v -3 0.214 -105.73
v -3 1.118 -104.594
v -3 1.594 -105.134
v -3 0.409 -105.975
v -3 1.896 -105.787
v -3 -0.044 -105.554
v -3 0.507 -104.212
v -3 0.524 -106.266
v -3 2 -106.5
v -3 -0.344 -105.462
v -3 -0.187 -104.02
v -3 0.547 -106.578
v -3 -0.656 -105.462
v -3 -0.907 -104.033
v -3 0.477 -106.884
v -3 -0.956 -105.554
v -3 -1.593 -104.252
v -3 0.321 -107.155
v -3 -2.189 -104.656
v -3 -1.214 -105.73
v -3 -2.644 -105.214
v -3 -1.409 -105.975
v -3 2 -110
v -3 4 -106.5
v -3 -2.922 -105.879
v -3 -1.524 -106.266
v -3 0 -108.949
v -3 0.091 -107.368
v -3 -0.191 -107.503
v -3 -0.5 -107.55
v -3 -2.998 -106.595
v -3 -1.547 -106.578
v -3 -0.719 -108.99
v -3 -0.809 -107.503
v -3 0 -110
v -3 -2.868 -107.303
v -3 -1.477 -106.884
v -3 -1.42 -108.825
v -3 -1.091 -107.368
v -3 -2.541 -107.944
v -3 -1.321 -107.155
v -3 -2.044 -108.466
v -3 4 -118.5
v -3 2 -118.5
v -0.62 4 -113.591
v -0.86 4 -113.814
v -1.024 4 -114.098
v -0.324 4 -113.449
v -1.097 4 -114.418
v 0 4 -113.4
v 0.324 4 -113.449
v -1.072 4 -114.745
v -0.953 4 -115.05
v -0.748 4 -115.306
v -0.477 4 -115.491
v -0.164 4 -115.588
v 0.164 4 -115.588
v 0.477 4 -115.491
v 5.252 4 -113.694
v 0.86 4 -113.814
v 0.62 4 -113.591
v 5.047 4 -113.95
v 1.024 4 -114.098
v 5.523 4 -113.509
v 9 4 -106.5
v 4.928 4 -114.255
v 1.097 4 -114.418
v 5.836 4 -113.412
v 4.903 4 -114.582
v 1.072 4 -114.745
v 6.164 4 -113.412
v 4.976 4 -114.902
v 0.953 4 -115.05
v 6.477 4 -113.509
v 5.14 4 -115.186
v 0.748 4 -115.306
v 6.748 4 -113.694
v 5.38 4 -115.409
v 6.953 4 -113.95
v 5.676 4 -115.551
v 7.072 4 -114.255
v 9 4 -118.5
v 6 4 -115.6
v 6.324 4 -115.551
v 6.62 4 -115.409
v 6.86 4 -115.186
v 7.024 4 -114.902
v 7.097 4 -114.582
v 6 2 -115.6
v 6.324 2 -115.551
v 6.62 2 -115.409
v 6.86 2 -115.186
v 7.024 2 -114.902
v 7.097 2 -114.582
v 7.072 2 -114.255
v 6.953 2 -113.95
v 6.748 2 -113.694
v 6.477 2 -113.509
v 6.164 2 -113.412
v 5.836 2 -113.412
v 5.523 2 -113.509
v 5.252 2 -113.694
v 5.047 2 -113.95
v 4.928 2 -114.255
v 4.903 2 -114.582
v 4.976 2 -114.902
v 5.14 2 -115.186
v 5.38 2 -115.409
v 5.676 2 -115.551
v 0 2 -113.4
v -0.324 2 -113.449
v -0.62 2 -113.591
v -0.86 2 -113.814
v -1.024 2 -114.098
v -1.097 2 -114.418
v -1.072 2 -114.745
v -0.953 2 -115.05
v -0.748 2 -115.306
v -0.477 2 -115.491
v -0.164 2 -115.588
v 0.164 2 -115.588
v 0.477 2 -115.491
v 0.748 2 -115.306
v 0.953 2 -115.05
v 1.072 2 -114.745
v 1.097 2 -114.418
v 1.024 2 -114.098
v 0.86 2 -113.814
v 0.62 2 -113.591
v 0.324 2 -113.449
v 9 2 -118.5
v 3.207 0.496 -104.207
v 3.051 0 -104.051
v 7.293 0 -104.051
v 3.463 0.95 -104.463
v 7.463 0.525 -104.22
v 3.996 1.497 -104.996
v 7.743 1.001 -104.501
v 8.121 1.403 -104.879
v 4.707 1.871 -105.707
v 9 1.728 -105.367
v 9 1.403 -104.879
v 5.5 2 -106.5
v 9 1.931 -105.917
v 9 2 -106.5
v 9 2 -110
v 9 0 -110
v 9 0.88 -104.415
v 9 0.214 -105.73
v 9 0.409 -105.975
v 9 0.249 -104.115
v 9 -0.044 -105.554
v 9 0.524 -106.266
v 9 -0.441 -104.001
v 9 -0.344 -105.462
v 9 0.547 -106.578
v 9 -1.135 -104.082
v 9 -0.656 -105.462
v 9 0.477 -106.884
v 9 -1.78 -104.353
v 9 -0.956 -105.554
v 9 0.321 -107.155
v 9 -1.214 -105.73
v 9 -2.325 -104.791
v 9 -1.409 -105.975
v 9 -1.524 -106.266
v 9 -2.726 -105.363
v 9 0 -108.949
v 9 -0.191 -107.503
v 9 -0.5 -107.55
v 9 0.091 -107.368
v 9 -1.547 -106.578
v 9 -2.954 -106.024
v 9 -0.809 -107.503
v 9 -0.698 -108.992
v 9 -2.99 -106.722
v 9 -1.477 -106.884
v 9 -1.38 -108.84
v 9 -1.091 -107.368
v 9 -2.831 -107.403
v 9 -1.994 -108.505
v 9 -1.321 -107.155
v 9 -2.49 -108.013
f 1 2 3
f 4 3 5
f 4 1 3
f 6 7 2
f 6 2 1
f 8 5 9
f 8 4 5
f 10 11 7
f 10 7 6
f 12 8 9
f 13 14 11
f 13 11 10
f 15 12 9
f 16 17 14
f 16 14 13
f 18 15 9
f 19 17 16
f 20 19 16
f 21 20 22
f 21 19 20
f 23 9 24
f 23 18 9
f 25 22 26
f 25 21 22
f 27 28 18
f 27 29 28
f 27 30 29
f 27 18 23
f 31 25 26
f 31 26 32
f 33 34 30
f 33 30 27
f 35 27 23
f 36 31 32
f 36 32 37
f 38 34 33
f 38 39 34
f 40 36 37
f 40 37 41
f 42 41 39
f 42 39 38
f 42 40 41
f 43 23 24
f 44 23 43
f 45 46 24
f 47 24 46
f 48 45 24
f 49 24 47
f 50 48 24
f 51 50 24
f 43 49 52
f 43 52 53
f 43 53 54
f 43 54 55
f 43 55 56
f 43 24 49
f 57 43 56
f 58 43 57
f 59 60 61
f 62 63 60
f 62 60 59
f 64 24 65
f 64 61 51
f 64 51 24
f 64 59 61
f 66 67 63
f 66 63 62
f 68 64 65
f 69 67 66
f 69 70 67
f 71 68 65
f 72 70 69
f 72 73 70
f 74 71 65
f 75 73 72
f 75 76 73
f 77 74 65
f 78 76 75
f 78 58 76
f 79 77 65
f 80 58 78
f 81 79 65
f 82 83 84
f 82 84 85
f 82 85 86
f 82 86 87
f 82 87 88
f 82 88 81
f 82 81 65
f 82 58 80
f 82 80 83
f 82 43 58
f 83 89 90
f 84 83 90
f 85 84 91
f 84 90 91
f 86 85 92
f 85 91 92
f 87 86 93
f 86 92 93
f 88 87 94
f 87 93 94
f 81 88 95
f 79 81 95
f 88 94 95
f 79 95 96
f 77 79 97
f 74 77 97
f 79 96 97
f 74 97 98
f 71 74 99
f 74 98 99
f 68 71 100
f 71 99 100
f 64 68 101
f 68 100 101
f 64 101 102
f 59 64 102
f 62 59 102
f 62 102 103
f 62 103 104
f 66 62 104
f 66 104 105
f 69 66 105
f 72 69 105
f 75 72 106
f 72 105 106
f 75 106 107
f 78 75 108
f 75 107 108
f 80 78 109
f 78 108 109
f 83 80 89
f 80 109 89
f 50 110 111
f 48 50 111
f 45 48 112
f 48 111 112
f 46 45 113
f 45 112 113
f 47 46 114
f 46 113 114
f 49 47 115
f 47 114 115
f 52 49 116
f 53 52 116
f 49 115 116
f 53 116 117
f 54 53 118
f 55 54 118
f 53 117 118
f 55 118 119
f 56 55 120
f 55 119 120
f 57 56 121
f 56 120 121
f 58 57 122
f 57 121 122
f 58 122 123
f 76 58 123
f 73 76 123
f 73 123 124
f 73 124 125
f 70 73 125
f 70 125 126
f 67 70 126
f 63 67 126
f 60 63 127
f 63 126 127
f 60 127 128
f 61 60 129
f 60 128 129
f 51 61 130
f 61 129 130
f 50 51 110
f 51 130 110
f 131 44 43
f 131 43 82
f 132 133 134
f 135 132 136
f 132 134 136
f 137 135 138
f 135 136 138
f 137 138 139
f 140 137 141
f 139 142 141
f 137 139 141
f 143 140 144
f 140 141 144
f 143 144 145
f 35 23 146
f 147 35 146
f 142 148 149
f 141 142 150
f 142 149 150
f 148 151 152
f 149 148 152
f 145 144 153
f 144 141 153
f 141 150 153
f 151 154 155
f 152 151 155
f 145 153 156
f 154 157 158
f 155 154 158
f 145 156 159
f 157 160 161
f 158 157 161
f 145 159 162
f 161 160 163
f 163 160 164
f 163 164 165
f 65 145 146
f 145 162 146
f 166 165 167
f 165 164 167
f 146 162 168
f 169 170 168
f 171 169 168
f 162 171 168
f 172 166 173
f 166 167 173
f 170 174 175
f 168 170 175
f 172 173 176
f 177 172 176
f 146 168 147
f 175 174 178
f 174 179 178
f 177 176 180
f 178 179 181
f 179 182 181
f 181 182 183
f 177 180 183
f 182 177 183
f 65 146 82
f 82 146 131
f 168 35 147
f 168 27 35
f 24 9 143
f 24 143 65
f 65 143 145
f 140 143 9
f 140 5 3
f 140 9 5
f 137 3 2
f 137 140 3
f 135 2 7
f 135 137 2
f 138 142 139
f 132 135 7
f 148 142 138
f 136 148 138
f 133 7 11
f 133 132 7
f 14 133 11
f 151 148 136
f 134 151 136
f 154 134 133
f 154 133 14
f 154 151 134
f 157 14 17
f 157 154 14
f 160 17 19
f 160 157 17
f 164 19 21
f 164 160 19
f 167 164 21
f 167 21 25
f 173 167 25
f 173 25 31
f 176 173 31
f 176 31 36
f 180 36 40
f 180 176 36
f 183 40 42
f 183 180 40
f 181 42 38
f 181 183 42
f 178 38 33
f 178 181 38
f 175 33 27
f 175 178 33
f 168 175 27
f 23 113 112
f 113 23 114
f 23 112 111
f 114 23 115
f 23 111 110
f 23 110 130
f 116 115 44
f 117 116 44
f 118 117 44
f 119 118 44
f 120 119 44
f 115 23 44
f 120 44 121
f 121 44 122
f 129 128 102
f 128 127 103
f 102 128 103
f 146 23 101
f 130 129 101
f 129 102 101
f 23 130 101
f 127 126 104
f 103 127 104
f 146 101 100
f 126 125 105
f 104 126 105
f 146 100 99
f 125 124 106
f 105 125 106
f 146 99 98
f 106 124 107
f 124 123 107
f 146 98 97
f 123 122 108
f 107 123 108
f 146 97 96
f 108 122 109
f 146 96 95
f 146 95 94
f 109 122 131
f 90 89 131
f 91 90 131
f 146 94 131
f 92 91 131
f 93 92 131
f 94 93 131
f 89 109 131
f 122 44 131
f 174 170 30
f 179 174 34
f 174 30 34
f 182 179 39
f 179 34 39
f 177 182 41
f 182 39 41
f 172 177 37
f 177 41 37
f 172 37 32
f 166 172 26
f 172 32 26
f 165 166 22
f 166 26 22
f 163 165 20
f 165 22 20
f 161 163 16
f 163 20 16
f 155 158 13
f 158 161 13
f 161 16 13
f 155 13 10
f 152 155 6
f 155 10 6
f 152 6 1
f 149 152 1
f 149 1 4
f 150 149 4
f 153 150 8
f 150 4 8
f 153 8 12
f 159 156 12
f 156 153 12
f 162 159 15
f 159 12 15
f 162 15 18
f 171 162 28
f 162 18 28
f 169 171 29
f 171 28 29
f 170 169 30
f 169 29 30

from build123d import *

# Parameters (mm, degrees)
SKETCH_1_W                      = 9.5
SKETCH_1_H                      = 13.25
EXTRUDE_1_DEPTH                 = 2
EXTRUDE_2_DEPTH                 = 12
PATTERN_LINEAR_1_COUNT          = 5
PATTERN_LINEAR_1_PITCH          = 22
HOLE_WIZARD_2_2_2_2_1_D         = 2.1
EXTRUDE_3_DEPTH                 = 12
SKETCH_7_W                      = 1.05
SKETCH_7_H                      = 15
EXTRUDE_4_DEPTH                 = 110
HOLE_WIZARD_2_0_2_2_D           = 2
HOLE_WIZARD_2_0_2_2_ON_FACE_2_D = 2
CUT_EXTRUDE_1_DEPTH             = 135.480746763
CUT_EXTRUDE_1_DEPTH_BACK        = 135.480746763
SKETCH_14_W                     = 52.846717088
SKETCH_14_H                     = 8
SKETCH19_W                      = 12
SKETCH19_H                      = 12
EXTRUDE23_DEPTH                 = 2
SKETCH20_R                      = 1.1
EXTRUDE24_DEPTH                 = 2
CUT_EXTRUDE_2_DEPTH             = 22
CUT_EXTRUDE_2_DEPTH_BACK        = 24
SKETCH_15_W                     = 124.248356878
SKETCH_15_H                     = 108.553418936
CUT_EXTRUDE_START               = -90
CUT_EXTRUDE_3_DEPTH             = 90
CUT_EXTRUDE_4_DEPTH             = 18
CUT_EXTRUDE_4_DEPTH_BACK        = 16
SKETCH_18_W                     = 34.927969389
SKETCH_18_H                     = 20.970488767


with BuildPart() as part:
    # 草图1 → 凸台-拉伸1 (new body)
    with BuildSketch(Plane(origin=(0, 0, 0), x_dir=(1, 0, 0), z_dir=(0, 1, 0))):
        Polygon((21.5, 0), (21.5, 110), (9, 110), (0, 101), (0, 0), align=None)
        Polygon((19.121320344, 101), (4.242640687, 101), (8.121320344, 104.878679656), (19.121320344, 104.878679656), align=None, mode=Mode.SUBTRACT)
        with Locations((10.75, 12.625)):
            Rectangle(SKETCH_1_W, SKETCH_1_H, mode=Mode.SUBTRACT)
        with Locations((10.75, 37.875)):
            Rectangle(SKETCH_1_W, SKETCH_1_H, mode=Mode.SUBTRACT)
        with Locations((10.75, 63.125)):
            Rectangle(SKETCH_1_W, SKETCH_1_H, mode=Mode.SUBTRACT)
        with Locations((10.75, 88.375)):
            Rectangle(SKETCH_1_W, SKETCH_1_H, mode=Mode.SUBTRACT)
    extrude(amount=EXTRUDE_1_DEPTH)

    # 草图2 → 凸台-拉伸2 (add)
    with BuildSketch(Plane(origin=(0, 0, -101), x_dir=(-1, 0, 0), z_dir=(0, 0, -1))):
        with BuildLine():
            Line((0, 2), (0, 0))
            Line((0, 0), (3.5, 0))
            ThreePointArc((3.5, 0), (5.08113883, 4.436491673), (1.050510257, 2))
            Line((1.050510257, 2), (0, 2))
        make_face()
    extrude_2 = extrude(amount=-EXTRUDE_2_DEPTH)

    # 阵列(线性)1: 凸台-拉伸2 ×5
    with Locations(*[(0, 0, i * PATTERN_LINEAR_1_PITCH) for i in range(1, PATTERN_LINEAR_1_COUNT)]):
        add(extrude_2)

    # Ø2.2 (2.2) 直径孔1 (through all)
    with Locations(Plane(origin=(0, 0, -101), x_dir=(-1, 0, 0), z_dir=(0, 0, -1))):
        with Locations((3.5, 2.5)):
            Hole(HOLE_WIZARD_2_2_2_2_1_D / 2)

    # 草图5 → 凸台-拉伸3 (add)
    with BuildSketch(Plane(origin=(9, 0, 0), x_dir=(0, 0, -1), z_dir=(1, 0, 0))):
        with BuildLine():
            Line((108.949489743, 0), (110, 0))
            Line((110, 0), (110, 2))
            Line((110, 2), (106.5, 2))
            ThreePointArc((106.5, 2), (104.91886117, -2.436491673), (108.949489743, 0))
        make_face()
    extrude(amount=-EXTRUDE_3_DEPTH)

    # 草图7 → Ø2.2 (2.2) 直径孔2 (revolve, cut)
    with BuildSketch(Plane(origin=(9, -0.5, -106.5), x_dir=(0, 0, -1), z_dir=(0, 1, 0))):
        with Locations((0.525, 7.5)):
            Rectangle(SKETCH_7_W, SKETCH_7_H)
    revolve(axis=Axis((15.35, -0.5, -106.5), (-1, 0, 0)), mode=Mode.SUBTRACT)

    # 草图8 → 凸台-拉伸4 (add)
    with BuildSketch(Plane.XY):
        with BuildLine():
            ThreePointArc((31.5, 0), (34.178784027, 0.532843272), (36.449747468, 2.050252532))
            Line((36.449747468, 2.050252532), (39.577164466, 5.17766953))
            ThreePointArc((39.577164466, 5.17766953), (57.254833996, 12.5), (74.932503526, 5.17766953))
            Line((74.932503526, 5.17766953), (76.346717088, 6.591883092))
            ThreePointArc((76.346717088, 6.591883092), (57.254833996, 14.5), (38.162950904, 6.591883092))
            Line((38.162950904, 6.591883092), (35.035533906, 3.464466094))
            ThreePointArc((35.035533906, 3.464466094), (33.413417162, 2.380602337), (31.5, 2))
            Line((31.5, 2), (21.5, 2))
            Line((21.5, 2), (21.5, 0))
            Line((21.5, 0), (31.5, 0))
        make_face()
    extrude(amount=-EXTRUDE_4_DEPTH)

    # Ø2.0 (2) 直径孔2 (through all)
    with Locations(Plane(origin=(66.489377866, 12.871700761, -5), x_dir=(0.939692620786, -0.342020143326, 0), z_dir=(0.342020143326, 0.939692620786, 0))):
        with Locations((0, 0)):
            Hole(HOLE_WIZARD_2_0_2_2_D / 2)

    # Ø2.0 (2) 直径孔2 on face 2 (through all)
    with Locations(Plane(origin=(66.489377866, 12.871700761, -52), x_dir=(0.939692711209, -0.342019894889, 0), z_dir=(0.342019894889, 0.939692711209, 0))):
        with Locations((0, 0)):
            Hole(HOLE_WIZARD_2_0_2_2_ON_FACE_2_D / 2)

    # 草图14 → 切除-拉伸1 (cut, two sides: drawn at the far end of the back side and taken through both)
    with BuildSketch(Plane(origin=(0, 2, 0), x_dir=(1, 0, 0), z_dir=(0, 1, 0)).offset(-CUT_EXTRUDE_1_DEPTH_BACK)):
        with BuildLine():
            add(Edge.make_bspline(
                [(65.543349365, 5), (65.543349365, 4.867858182), (65.568139282, 4.738193315), (65.663651177, 4.49599396), (65.734288369, 4.385069362), (65.909329104, 4.20058787), (66.014984918, 4.126085586), (66.242291721, 4.026337096), (66.366299142, 4.000069682), (66.611454679, 3.999930602), (66.734292904, 4.025809235), (66.960669981, 4.125923854), (67.063423157, 4.199243917), (67.237262204, 4.385832013), (67.305425299, 4.495895945), (67.398649167, 4.738239585), (67.422691544, 4.869119898), (67.422777552, 5.130169285), (67.398544475, 5.261724961), (67.306168595, 5.502477284), (67.237041074, 5.614131138), (67.065581718, 5.798710334), (66.962099904, 5.873181003), (66.736029766, 5.973681753), (66.61428089, 5.999865952), (66.366377399, 6.000133023), (66.24402893, 5.974291959), (66.014886358, 5.874003493), (65.90992169, 5.799906628), (65.647004042, 5.52319771), (65.543349365, 5.264283637), (65.543349365, 5)],
                knots=[0, 0, 0, 0, 0.0625, 0.0625, 0.125, 0.125, 0.1875, 0.1875, 0.25, 0.25, 0.3125, 0.3125, 0.375, 0.375, 0.4375, 0.4375, 0.5, 0.5, 0.5625, 0.5625, 0.625, 0.625, 0.6875, 0.6875, 0.75, 0.75, 0.8125, 0.8125, 0.875, 0.875, 1, 1, 1, 1], degree=3))
        make_face()
        with Locations((46.923358544, 14)):
            Rectangle(SKETCH_14_W, SKETCH_14_H)
        with Locations((46.923358544, 61)):
            Rectangle(SKETCH_14_W, SKETCH_14_H)
    extrude(amount=CUT_EXTRUDE_1_DEPTH + CUT_EXTRUDE_1_DEPTH_BACK, mode=Mode.SUBTRACT)

    # Sketch19 → Extrude23 (add)
    with BuildSketch(Plane(origin=(0, 2, 0), x_dir=(1, 0, 0), z_dir=(0, 1, 0))):
        with Locations((3, 112.5)):
            Rectangle(SKETCH19_W, SKETCH19_H)
    extrude(amount=EXTRUDE23_DEPTH)

    # Sketch20 → Extrude24 (cut)
    with BuildSketch(Plane(origin=(0, 2, 0), x_dir=(-1, 0, 0), z_dir=(0, -1, 0))):
        with Locations(Location((-6, 114.5, 0), (0, 0, 90))):
            Circle(SKETCH20_R)
        with Locations(Location((0, 114.5, 0), (0, 0, 270))):
            Circle(SKETCH20_R)
    extrude(amount=-EXTRUDE24_DEPTH, mode=Mode.SUBTRACT)

    # 草图15 → 切除-拉伸2 (cut, two sides: drawn at the far end of the back side and taken through both)
    with BuildSketch(Plane(origin=(0, 2, 0), x_dir=(1, 0, 0), z_dir=(0, 1, 0)).offset(-CUT_EXTRUDE_2_DEPTH_BACK)):
        with Locations((56.124178439, 46.723290532)):
            Rectangle(SKETCH_15_W, SKETCH_15_H)
    extrude(amount=CUT_EXTRUDE_2_DEPTH + CUT_EXTRUDE_2_DEPTH_BACK, mode=Mode.SUBTRACT)

    # 草图17 → 切除-拉伸3 (cut)
    with BuildSketch(Plane.ZY.offset(3).offset(CUT_EXTRUDE_START)):
        with BuildLine():
            Line((-106.5, 2), (-106.5, 4))
            Line((-106.5, 4), (-110, 4))
            Line((-110, 4), (-110, 14.5))
            Line((-110, 14.5), (-101, 14.5))
            Line((-101, 14.5), (-101, 0))
            Line((-101, 0), (-104.050510257, 0))
            ThreePointArc((-104.050510257, 0), (-104.91886117, 1.436491673), (-106.5, 2))
        make_face()
    extrude(amount=CUT_EXTRUDE_3_DEPTH, mode=Mode.SUBTRACT)

    # 草图18 → 切除-拉伸4 (cut, two sides: drawn at the far end of the back side and taken through both)
    with BuildSketch(Plane(origin=(0, 4, 0), x_dir=(1, 0, 0), z_dir=(0, 1, 0)).offset(-CUT_EXTRUDE_4_DEPTH_BACK)):
        with Locations((26.463984695, 108.014755617)):
            Rectangle(SKETCH_18_W, SKETCH_18_H)
    extrude(amount=CUT_EXTRUDE_4_DEPTH + CUT_EXTRUDE_4_DEPTH_BACK, mode=Mode.SUBTRACT)


solid = part.part
